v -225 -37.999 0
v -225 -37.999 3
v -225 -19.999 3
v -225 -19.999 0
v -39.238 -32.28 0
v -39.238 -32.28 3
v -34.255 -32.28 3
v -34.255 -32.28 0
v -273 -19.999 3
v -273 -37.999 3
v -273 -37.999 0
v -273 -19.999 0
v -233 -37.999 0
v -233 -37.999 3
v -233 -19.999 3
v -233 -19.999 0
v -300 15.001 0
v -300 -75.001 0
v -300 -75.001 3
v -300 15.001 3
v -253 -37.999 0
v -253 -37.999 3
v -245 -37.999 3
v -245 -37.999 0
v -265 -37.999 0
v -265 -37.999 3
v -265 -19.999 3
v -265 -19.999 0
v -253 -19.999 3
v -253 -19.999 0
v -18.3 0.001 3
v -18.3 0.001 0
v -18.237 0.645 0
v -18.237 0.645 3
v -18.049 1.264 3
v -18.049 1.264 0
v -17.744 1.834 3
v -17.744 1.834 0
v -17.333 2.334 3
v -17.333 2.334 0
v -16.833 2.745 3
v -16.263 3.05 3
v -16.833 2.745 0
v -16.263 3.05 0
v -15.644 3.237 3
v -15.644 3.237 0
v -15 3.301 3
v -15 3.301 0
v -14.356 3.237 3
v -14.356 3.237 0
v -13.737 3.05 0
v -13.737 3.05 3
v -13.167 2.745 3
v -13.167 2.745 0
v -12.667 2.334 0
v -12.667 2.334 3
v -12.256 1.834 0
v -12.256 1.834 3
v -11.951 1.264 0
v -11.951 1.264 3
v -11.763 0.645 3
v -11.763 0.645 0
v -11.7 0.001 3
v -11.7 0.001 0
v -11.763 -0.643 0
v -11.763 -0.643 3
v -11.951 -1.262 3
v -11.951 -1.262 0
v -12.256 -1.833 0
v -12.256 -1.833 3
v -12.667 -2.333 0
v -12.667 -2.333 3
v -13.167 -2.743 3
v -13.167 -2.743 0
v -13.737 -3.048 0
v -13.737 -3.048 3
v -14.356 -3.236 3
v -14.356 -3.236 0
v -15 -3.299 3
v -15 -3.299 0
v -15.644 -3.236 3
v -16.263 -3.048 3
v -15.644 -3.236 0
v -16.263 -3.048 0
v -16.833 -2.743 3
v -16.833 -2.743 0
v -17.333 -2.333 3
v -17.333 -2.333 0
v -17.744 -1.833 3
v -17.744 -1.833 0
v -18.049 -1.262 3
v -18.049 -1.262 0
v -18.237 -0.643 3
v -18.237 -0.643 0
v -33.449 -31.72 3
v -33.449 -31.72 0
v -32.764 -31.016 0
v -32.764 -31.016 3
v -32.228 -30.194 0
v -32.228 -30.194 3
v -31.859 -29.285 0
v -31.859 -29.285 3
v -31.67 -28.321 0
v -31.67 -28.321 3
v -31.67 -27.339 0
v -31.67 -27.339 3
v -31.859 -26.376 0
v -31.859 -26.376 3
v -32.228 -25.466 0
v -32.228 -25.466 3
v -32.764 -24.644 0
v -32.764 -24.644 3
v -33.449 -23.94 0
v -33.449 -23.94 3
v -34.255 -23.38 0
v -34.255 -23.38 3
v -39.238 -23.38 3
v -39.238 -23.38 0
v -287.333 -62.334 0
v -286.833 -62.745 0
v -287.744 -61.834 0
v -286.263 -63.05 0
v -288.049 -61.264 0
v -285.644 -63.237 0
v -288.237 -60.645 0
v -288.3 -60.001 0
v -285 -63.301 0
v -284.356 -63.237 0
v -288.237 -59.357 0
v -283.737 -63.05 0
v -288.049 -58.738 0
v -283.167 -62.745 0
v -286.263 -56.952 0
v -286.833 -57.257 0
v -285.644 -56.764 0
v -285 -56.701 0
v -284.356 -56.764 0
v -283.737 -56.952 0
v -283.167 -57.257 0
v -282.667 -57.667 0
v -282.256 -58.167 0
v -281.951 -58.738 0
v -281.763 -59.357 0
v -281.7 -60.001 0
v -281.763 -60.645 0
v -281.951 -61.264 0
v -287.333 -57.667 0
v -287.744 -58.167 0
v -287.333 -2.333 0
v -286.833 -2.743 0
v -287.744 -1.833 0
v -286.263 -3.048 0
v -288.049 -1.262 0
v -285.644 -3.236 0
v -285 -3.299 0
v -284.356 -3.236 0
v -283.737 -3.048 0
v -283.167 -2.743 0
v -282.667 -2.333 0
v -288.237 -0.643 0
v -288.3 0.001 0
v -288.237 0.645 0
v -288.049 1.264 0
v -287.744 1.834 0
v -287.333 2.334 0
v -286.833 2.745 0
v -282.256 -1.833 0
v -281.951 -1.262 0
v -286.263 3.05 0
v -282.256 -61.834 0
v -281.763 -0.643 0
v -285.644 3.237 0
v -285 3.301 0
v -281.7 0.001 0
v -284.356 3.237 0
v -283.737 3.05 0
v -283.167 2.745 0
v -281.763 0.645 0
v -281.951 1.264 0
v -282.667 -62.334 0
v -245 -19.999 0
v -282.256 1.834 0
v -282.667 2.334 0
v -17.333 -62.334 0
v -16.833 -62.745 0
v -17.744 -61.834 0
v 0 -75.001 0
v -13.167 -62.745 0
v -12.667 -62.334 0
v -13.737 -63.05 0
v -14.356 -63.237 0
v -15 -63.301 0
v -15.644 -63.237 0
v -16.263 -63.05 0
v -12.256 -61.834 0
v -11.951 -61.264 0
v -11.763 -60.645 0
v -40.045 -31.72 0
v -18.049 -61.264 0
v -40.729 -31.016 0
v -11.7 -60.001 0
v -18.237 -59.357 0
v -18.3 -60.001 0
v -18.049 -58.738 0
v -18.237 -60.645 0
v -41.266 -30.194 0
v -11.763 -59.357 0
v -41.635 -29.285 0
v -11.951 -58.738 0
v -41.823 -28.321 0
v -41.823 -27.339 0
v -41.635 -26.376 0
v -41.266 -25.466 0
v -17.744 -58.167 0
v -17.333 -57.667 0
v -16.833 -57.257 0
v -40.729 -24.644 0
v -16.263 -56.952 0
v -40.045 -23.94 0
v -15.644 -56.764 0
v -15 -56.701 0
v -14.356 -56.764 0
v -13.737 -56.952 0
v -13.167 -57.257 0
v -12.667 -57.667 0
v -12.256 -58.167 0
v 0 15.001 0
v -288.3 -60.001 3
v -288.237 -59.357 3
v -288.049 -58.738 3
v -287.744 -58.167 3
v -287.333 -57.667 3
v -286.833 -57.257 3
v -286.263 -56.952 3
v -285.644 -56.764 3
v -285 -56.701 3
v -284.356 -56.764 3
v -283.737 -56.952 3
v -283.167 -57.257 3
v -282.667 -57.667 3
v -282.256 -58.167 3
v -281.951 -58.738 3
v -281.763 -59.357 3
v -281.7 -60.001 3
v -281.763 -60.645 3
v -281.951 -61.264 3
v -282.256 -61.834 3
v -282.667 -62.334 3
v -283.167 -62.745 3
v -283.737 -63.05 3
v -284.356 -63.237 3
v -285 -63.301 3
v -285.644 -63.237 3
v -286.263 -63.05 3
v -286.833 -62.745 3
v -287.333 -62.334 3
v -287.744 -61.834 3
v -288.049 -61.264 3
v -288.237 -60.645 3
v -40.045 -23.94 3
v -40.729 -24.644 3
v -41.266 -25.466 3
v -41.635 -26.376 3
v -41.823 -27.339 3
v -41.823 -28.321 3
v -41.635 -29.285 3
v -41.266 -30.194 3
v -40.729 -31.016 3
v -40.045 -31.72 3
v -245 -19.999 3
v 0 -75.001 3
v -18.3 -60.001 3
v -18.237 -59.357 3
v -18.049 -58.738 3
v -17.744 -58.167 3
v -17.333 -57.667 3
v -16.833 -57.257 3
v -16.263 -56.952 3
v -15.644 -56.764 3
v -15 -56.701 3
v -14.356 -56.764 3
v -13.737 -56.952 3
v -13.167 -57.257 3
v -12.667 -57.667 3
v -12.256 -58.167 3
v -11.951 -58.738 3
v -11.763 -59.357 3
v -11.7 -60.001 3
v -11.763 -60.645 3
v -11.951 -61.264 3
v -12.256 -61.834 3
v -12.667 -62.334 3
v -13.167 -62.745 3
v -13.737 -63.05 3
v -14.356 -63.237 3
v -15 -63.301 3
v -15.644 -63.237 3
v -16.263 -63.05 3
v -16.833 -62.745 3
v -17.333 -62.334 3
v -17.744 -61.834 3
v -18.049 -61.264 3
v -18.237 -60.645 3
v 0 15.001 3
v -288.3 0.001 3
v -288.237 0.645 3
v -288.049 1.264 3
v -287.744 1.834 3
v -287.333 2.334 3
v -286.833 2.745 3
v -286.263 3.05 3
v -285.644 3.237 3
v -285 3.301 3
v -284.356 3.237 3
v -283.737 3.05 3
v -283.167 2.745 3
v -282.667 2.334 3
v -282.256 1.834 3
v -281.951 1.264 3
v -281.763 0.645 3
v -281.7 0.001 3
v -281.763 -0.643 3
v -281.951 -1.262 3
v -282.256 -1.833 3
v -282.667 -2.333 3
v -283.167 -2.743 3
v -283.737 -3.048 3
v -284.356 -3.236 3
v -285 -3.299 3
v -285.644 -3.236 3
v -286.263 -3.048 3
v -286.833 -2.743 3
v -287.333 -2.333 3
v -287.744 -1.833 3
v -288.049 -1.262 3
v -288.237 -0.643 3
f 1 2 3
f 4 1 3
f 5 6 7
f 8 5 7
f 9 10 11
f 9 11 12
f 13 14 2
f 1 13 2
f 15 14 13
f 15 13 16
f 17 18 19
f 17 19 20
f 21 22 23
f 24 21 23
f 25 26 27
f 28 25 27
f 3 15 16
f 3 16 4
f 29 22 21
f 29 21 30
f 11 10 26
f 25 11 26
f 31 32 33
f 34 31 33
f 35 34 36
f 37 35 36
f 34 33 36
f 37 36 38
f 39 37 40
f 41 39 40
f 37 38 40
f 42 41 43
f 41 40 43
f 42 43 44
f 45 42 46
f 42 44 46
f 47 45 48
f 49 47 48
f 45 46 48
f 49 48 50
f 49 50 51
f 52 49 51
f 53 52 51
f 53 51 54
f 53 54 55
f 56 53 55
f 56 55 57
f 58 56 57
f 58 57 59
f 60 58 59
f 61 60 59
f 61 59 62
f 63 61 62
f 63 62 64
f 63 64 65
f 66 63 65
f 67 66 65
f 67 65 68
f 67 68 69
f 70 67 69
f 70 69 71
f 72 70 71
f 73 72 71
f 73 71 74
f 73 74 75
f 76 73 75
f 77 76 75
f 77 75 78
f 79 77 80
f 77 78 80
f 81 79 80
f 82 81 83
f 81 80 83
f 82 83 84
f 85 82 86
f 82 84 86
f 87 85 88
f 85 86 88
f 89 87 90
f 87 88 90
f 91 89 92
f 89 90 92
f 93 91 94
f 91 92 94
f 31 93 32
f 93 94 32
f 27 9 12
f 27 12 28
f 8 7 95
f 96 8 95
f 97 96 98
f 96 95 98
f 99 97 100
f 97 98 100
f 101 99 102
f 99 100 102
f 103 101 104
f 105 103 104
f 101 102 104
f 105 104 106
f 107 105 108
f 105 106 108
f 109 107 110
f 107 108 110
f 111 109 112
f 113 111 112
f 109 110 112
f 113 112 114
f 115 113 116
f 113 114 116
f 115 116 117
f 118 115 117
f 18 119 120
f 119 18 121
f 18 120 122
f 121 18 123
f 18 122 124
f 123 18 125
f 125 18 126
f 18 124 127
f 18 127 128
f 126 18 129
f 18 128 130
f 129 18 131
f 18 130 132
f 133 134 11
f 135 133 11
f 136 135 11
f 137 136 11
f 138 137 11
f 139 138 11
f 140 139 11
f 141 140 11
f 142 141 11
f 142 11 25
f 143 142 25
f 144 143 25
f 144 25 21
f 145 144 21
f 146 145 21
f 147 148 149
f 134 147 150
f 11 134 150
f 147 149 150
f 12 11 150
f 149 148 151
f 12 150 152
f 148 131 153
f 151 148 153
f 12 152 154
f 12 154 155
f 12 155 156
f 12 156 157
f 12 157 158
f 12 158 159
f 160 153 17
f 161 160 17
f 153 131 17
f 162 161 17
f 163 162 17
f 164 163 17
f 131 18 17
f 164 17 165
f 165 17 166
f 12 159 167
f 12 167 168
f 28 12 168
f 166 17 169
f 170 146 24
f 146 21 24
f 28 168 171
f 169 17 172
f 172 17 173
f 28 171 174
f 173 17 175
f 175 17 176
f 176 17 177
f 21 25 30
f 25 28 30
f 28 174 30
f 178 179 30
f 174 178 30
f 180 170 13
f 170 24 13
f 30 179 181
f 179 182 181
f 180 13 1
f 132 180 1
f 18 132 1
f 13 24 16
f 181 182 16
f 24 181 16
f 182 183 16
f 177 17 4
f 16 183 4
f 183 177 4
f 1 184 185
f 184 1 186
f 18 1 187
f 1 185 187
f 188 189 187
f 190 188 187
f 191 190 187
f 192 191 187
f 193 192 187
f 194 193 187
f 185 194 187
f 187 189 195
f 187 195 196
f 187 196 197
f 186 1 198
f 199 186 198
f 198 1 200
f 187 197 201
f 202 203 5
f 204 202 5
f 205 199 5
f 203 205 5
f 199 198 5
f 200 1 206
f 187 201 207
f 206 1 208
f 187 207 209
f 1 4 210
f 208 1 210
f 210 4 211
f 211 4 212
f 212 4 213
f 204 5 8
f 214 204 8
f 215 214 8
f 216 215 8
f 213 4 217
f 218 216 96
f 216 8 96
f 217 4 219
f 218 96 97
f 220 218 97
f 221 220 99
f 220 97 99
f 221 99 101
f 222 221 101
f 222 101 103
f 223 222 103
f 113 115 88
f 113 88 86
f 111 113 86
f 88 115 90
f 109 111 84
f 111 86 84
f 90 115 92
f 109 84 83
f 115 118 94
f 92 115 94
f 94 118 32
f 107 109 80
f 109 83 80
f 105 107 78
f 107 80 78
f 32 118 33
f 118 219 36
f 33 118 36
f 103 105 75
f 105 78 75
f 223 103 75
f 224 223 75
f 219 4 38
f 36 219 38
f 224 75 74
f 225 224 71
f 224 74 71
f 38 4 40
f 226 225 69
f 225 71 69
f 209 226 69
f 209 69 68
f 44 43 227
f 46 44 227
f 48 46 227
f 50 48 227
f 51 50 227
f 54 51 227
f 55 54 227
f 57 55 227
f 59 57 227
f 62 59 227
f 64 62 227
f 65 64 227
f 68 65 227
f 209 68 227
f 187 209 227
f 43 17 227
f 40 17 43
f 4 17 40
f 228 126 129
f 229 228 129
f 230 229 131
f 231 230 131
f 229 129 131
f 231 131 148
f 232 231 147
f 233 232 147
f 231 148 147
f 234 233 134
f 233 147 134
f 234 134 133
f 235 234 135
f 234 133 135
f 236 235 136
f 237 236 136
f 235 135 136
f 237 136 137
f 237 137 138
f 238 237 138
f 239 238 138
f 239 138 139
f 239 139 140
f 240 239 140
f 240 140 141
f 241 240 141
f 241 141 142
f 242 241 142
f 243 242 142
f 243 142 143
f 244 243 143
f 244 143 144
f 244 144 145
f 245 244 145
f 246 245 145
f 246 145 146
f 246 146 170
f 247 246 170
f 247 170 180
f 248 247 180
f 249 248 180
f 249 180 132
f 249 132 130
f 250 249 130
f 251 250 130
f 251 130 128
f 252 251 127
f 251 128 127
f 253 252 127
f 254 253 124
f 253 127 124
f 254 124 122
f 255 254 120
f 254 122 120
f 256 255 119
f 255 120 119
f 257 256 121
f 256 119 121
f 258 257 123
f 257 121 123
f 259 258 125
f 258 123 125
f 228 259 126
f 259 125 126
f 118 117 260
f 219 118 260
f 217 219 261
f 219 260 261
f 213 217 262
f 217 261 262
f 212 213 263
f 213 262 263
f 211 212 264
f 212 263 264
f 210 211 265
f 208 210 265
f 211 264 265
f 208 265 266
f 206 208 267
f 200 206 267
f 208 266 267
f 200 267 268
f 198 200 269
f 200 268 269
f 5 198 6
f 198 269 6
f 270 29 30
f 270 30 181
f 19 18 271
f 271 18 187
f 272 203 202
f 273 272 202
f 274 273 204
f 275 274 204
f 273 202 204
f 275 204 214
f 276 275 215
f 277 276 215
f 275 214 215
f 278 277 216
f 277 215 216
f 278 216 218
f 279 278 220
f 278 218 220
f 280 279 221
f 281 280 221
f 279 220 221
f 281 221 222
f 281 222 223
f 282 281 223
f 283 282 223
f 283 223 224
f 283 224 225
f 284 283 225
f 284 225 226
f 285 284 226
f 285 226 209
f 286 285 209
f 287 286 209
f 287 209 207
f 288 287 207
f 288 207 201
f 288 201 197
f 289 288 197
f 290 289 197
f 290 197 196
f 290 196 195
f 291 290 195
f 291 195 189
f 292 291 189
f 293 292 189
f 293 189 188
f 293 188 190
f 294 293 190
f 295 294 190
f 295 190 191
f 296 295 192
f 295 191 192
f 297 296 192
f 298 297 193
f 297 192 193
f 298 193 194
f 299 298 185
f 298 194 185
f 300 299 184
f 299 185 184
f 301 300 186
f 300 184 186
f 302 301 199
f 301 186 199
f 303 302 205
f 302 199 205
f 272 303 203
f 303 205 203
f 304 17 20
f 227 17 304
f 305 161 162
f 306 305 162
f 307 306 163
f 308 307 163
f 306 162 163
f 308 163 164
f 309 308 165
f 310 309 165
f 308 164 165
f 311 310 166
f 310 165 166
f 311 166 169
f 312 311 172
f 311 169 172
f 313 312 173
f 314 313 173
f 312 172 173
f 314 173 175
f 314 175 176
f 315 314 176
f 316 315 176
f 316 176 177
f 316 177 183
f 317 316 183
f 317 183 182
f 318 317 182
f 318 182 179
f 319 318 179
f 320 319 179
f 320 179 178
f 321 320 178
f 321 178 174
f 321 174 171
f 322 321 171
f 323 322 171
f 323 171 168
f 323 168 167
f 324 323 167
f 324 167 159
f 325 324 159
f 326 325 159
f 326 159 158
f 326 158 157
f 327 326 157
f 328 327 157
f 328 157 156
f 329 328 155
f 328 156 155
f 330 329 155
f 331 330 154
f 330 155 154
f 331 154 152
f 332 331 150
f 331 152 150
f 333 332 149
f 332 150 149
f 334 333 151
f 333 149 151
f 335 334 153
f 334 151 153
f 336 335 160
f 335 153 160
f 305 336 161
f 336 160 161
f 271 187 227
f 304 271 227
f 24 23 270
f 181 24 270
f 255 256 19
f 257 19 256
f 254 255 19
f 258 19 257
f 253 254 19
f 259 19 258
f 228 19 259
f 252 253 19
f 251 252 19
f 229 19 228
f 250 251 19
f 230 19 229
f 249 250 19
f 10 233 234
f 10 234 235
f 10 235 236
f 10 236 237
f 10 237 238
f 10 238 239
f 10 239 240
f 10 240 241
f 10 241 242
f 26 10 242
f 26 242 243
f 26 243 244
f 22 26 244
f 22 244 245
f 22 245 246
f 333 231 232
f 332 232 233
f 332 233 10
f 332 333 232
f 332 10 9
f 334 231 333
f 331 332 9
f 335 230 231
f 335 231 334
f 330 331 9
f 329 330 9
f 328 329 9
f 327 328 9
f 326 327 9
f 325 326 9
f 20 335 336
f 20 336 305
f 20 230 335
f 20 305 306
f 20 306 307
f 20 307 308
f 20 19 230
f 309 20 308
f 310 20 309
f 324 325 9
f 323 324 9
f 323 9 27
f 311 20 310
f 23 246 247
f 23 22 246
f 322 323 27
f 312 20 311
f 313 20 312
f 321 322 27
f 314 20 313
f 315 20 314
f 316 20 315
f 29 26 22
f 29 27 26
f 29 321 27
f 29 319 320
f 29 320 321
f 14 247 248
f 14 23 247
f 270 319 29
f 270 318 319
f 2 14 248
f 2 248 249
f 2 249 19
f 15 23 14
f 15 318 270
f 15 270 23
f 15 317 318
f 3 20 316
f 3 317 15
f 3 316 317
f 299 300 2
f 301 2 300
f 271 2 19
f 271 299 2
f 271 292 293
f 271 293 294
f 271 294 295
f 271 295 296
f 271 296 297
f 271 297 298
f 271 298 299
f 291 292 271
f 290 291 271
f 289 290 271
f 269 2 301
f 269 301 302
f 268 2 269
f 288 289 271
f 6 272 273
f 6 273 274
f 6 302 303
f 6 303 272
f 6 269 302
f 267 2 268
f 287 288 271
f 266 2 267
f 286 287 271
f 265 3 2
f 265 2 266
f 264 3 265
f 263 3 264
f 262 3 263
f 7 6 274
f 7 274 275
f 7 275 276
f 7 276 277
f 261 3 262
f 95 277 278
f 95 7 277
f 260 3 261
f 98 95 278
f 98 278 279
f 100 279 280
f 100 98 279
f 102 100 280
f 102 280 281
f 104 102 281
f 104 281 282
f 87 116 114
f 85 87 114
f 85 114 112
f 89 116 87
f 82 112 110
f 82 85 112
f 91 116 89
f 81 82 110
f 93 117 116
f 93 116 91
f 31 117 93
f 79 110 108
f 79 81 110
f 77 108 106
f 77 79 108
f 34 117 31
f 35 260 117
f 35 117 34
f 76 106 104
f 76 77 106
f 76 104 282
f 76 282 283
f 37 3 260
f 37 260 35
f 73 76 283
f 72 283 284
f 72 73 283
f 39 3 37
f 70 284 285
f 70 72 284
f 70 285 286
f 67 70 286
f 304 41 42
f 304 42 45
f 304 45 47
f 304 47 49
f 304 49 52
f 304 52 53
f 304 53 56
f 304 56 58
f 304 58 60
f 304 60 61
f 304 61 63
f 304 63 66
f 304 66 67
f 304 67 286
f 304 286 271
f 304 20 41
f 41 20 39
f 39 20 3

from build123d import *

# Parameters (mm, degrees)
SKIZZE1_W                       = 300
SKIZZE1_H                       = 90.0015
AUFSATZ_LINEAR_AUSTRAGEN1_DEPTH = 3
DURCHGANGSLOCH_F_R_M61_D        = 6.6
SKIZZE4_W                       = 8
SKIZZE4_H                       = 18
SCHNITT_LINEAR_AUSTRAGEN1_DEPTH = 10
SCHNITT_LINEAR_AUSTRAGEN2_DEPTH = 10


with BuildPart() as part:
    # Skizze1 → Aufsatz-Linear austragen1 (new body)
    with BuildSketch(Plane.XY):
        with Locations((-150, -29.999999991)):
            Rectangle(SKIZZE1_W, SKIZZE1_H)
    extrude(amount=AUFSATZ_LINEAR_AUSTRAGEN1_DEPTH)

    # Durchgangsloch für M61 (through all)
    with Locations(Plane.XY.offset(3)):
        with Locations((-15, 0.000750009), (-15, -60.000749991), (-285, -60.000749991), (-285, 0.000750009)):
            Hole(DURCHGANGSLOCH_F_R_M61_D / 2)

    # Skizze4 → Schnitt-Linear austragen1 (cut)
    with BuildSketch(Plane.XY.offset(3)):
        with Locations((-269, -28.999249991)):
            Rectangle(SKIZZE4_W, SKIZZE4_H)
        with Locations((-249, -28.999249991)):
            Rectangle(SKIZZE4_W, SKIZZE4_H)
        with Locations((-229, -28.999249991)):
            Rectangle(SKIZZE4_W, SKIZZE4_H)
    extrude(amount=-SCHNITT_LINEAR_AUSTRAGEN1_DEPTH, mode=Mode.SUBTRACT)

    # Skizze5 → Schnitt-Linear austragen2 (cut)
    with BuildSketch(Plane.XY.offset(3)):
        with BuildLine():
            Line((-34.255252171, -23.380072644), (-39.238223172, -23.380072644))
            ThreePointArc((-39.238223172, -23.380072644), (-41.846737672, -27.830072644), (-39.238223172, -32.280072644))
            Line((-39.238223172, -32.280072644), (-34.255252171, -32.280072644))
            ThreePointArc((-34.255252171, -32.280072644), (-31.646737672, -27.830072644), (-34.255252171, -23.380072644))
        make_face()
    extrude(amount=-SCHNITT_LINEAR_AUSTRAGEN2_DEPTH, mode=Mode.SUBTRACT)


solid = part.part
